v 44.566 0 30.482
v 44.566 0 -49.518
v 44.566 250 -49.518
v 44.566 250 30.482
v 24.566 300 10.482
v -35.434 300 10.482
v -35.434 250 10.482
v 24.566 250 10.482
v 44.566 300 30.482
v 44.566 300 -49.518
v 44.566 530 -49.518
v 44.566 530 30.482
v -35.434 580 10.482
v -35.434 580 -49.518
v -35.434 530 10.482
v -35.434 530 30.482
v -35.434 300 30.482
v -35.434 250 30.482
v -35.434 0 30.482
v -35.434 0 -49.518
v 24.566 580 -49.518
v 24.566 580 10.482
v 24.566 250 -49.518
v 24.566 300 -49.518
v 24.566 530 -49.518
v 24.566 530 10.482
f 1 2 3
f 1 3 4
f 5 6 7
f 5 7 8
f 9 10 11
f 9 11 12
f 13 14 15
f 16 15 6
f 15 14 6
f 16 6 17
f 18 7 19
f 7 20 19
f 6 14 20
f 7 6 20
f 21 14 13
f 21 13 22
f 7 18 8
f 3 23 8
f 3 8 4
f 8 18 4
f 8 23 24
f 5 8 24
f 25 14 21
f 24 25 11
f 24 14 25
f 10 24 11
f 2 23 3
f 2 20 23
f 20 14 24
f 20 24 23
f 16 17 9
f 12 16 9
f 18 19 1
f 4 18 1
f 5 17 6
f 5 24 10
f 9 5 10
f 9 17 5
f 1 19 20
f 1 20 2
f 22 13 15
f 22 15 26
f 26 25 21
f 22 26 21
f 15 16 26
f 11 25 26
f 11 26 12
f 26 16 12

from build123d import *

# Parameters (mm, degrees)
F0_W     = 80
F0_H     = 80
F1_DEPTH = 580
F2_W     = 80
F2_H     = 50
F3_DEPTH = 20
F4_W     = 50
F4_H     = 60
F5_DEPTH = 20
F6_W     = 80
F6_H     = 50
F7_DEPTH = 20
F8_W     = 50
F8_H     = 60
F9_DEPTH = 20


with BuildPart() as f1:
    # F0 (on Front) → F1 (new body)
    with BuildSketch(Plane.XZ):
        with Locations((4.566346, -9.518241)):
            Rectangle(F0_W, F0_H)
    extrude(amount=-F1_DEPTH)

    # F2 (on face) → F3 (cut)
    with BuildSketch(Plane.XY.offset(30.481759)):
        with Locations((4.566346, 275)):
            Rectangle(F2_W, F2_H)
    extrude(amount=-F3_DEPTH, mode=Mode.SUBTRACT)

    # F4 (on face) → F5 (cut)
    with BuildSketch(Plane.YZ.offset(44.566346)):
        with Locations((275, -19.518241)):
            Rectangle(F4_W, F4_H)
    extrude(amount=-F5_DEPTH, mode=Mode.SUBTRACT)

    # F6 (on face) → F7 (cut)
    with BuildSketch(Plane.XY.offset(30.481759)):
        with Locations((4.566346, 555)):
            Rectangle(F6_W, F6_H)
    extrude(amount=-F7_DEPTH, mode=Mode.SUBTRACT)

    # F8 (on face) → F9 (cut)
    with BuildSketch(Plane.YZ.offset(44.566346)):
        with Locations((555, -19.518241)):
            Rectangle(F8_W, F8_H)
    extrude(amount=-F9_DEPTH, mode=Mode.SUBTRACT)


solid = f1.part
